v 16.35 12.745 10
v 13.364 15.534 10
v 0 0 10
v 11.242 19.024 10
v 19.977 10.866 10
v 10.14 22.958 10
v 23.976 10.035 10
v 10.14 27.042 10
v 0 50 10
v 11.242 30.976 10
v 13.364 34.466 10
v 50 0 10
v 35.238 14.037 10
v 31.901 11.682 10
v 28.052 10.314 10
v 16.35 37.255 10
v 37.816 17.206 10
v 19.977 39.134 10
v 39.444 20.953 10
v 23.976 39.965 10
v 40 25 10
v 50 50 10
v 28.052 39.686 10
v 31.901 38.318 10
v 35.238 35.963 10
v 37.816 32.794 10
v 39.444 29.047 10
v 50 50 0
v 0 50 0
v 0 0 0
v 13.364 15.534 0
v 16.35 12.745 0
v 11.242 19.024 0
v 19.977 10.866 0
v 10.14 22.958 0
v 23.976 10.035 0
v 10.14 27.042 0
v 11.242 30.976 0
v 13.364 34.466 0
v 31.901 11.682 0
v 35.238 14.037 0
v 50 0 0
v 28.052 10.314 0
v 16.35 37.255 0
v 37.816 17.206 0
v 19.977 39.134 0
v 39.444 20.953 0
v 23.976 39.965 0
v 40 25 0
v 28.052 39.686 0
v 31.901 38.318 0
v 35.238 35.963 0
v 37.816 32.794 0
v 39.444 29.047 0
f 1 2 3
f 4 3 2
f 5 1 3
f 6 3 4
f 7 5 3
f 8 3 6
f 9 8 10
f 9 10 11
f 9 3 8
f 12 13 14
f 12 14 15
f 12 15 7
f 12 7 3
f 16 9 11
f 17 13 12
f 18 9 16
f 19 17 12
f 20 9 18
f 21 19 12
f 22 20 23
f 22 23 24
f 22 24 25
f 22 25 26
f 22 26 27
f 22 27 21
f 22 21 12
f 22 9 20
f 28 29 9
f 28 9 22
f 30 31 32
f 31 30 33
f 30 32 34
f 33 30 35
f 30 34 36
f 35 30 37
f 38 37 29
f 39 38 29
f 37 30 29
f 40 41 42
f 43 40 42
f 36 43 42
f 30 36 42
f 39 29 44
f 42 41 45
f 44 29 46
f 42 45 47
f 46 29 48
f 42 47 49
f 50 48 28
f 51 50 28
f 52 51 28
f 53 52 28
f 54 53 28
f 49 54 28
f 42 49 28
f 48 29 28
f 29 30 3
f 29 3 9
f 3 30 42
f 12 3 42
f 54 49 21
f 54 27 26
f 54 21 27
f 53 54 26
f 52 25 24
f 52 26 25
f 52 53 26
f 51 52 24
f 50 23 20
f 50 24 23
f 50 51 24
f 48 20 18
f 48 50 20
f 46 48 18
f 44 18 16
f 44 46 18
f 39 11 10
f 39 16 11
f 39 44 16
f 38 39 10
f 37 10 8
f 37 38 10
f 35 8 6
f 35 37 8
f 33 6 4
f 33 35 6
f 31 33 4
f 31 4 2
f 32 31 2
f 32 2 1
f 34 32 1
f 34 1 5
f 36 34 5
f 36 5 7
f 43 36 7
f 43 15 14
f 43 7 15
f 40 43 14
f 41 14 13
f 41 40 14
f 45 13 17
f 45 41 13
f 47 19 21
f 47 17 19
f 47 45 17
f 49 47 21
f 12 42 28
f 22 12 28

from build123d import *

# Parameters (mm, degrees)
CYLINDER_R     = 15
CYLINDER_DEPTH = 40
BOX_W          = 50
BOX_H          = 50
BOX_DEPTH      = 10


with BuildPart() as cylinder:
    # Cylinder → Cylinder (new body)
    with BuildSketch(Plane(origin=(25, 25, -12), x_dir=(1, 0, 0), z_dir=(0, 0, 1))):
        Circle(CYLINDER_R)
    extrude(amount=CYLINDER_DEPTH)


with BuildPart() as cut:
    # Box → Box (new body)
    with BuildSketch(Plane.XY):
        with Locations((25, 25)):
            Rectangle(BOX_W, BOX_H)
    extrude(amount=BOX_DEPTH)

    # Cut: cut Cylinder
    add(cylinder.part, mode=Mode.SUBTRACT)


solid = cut.part
